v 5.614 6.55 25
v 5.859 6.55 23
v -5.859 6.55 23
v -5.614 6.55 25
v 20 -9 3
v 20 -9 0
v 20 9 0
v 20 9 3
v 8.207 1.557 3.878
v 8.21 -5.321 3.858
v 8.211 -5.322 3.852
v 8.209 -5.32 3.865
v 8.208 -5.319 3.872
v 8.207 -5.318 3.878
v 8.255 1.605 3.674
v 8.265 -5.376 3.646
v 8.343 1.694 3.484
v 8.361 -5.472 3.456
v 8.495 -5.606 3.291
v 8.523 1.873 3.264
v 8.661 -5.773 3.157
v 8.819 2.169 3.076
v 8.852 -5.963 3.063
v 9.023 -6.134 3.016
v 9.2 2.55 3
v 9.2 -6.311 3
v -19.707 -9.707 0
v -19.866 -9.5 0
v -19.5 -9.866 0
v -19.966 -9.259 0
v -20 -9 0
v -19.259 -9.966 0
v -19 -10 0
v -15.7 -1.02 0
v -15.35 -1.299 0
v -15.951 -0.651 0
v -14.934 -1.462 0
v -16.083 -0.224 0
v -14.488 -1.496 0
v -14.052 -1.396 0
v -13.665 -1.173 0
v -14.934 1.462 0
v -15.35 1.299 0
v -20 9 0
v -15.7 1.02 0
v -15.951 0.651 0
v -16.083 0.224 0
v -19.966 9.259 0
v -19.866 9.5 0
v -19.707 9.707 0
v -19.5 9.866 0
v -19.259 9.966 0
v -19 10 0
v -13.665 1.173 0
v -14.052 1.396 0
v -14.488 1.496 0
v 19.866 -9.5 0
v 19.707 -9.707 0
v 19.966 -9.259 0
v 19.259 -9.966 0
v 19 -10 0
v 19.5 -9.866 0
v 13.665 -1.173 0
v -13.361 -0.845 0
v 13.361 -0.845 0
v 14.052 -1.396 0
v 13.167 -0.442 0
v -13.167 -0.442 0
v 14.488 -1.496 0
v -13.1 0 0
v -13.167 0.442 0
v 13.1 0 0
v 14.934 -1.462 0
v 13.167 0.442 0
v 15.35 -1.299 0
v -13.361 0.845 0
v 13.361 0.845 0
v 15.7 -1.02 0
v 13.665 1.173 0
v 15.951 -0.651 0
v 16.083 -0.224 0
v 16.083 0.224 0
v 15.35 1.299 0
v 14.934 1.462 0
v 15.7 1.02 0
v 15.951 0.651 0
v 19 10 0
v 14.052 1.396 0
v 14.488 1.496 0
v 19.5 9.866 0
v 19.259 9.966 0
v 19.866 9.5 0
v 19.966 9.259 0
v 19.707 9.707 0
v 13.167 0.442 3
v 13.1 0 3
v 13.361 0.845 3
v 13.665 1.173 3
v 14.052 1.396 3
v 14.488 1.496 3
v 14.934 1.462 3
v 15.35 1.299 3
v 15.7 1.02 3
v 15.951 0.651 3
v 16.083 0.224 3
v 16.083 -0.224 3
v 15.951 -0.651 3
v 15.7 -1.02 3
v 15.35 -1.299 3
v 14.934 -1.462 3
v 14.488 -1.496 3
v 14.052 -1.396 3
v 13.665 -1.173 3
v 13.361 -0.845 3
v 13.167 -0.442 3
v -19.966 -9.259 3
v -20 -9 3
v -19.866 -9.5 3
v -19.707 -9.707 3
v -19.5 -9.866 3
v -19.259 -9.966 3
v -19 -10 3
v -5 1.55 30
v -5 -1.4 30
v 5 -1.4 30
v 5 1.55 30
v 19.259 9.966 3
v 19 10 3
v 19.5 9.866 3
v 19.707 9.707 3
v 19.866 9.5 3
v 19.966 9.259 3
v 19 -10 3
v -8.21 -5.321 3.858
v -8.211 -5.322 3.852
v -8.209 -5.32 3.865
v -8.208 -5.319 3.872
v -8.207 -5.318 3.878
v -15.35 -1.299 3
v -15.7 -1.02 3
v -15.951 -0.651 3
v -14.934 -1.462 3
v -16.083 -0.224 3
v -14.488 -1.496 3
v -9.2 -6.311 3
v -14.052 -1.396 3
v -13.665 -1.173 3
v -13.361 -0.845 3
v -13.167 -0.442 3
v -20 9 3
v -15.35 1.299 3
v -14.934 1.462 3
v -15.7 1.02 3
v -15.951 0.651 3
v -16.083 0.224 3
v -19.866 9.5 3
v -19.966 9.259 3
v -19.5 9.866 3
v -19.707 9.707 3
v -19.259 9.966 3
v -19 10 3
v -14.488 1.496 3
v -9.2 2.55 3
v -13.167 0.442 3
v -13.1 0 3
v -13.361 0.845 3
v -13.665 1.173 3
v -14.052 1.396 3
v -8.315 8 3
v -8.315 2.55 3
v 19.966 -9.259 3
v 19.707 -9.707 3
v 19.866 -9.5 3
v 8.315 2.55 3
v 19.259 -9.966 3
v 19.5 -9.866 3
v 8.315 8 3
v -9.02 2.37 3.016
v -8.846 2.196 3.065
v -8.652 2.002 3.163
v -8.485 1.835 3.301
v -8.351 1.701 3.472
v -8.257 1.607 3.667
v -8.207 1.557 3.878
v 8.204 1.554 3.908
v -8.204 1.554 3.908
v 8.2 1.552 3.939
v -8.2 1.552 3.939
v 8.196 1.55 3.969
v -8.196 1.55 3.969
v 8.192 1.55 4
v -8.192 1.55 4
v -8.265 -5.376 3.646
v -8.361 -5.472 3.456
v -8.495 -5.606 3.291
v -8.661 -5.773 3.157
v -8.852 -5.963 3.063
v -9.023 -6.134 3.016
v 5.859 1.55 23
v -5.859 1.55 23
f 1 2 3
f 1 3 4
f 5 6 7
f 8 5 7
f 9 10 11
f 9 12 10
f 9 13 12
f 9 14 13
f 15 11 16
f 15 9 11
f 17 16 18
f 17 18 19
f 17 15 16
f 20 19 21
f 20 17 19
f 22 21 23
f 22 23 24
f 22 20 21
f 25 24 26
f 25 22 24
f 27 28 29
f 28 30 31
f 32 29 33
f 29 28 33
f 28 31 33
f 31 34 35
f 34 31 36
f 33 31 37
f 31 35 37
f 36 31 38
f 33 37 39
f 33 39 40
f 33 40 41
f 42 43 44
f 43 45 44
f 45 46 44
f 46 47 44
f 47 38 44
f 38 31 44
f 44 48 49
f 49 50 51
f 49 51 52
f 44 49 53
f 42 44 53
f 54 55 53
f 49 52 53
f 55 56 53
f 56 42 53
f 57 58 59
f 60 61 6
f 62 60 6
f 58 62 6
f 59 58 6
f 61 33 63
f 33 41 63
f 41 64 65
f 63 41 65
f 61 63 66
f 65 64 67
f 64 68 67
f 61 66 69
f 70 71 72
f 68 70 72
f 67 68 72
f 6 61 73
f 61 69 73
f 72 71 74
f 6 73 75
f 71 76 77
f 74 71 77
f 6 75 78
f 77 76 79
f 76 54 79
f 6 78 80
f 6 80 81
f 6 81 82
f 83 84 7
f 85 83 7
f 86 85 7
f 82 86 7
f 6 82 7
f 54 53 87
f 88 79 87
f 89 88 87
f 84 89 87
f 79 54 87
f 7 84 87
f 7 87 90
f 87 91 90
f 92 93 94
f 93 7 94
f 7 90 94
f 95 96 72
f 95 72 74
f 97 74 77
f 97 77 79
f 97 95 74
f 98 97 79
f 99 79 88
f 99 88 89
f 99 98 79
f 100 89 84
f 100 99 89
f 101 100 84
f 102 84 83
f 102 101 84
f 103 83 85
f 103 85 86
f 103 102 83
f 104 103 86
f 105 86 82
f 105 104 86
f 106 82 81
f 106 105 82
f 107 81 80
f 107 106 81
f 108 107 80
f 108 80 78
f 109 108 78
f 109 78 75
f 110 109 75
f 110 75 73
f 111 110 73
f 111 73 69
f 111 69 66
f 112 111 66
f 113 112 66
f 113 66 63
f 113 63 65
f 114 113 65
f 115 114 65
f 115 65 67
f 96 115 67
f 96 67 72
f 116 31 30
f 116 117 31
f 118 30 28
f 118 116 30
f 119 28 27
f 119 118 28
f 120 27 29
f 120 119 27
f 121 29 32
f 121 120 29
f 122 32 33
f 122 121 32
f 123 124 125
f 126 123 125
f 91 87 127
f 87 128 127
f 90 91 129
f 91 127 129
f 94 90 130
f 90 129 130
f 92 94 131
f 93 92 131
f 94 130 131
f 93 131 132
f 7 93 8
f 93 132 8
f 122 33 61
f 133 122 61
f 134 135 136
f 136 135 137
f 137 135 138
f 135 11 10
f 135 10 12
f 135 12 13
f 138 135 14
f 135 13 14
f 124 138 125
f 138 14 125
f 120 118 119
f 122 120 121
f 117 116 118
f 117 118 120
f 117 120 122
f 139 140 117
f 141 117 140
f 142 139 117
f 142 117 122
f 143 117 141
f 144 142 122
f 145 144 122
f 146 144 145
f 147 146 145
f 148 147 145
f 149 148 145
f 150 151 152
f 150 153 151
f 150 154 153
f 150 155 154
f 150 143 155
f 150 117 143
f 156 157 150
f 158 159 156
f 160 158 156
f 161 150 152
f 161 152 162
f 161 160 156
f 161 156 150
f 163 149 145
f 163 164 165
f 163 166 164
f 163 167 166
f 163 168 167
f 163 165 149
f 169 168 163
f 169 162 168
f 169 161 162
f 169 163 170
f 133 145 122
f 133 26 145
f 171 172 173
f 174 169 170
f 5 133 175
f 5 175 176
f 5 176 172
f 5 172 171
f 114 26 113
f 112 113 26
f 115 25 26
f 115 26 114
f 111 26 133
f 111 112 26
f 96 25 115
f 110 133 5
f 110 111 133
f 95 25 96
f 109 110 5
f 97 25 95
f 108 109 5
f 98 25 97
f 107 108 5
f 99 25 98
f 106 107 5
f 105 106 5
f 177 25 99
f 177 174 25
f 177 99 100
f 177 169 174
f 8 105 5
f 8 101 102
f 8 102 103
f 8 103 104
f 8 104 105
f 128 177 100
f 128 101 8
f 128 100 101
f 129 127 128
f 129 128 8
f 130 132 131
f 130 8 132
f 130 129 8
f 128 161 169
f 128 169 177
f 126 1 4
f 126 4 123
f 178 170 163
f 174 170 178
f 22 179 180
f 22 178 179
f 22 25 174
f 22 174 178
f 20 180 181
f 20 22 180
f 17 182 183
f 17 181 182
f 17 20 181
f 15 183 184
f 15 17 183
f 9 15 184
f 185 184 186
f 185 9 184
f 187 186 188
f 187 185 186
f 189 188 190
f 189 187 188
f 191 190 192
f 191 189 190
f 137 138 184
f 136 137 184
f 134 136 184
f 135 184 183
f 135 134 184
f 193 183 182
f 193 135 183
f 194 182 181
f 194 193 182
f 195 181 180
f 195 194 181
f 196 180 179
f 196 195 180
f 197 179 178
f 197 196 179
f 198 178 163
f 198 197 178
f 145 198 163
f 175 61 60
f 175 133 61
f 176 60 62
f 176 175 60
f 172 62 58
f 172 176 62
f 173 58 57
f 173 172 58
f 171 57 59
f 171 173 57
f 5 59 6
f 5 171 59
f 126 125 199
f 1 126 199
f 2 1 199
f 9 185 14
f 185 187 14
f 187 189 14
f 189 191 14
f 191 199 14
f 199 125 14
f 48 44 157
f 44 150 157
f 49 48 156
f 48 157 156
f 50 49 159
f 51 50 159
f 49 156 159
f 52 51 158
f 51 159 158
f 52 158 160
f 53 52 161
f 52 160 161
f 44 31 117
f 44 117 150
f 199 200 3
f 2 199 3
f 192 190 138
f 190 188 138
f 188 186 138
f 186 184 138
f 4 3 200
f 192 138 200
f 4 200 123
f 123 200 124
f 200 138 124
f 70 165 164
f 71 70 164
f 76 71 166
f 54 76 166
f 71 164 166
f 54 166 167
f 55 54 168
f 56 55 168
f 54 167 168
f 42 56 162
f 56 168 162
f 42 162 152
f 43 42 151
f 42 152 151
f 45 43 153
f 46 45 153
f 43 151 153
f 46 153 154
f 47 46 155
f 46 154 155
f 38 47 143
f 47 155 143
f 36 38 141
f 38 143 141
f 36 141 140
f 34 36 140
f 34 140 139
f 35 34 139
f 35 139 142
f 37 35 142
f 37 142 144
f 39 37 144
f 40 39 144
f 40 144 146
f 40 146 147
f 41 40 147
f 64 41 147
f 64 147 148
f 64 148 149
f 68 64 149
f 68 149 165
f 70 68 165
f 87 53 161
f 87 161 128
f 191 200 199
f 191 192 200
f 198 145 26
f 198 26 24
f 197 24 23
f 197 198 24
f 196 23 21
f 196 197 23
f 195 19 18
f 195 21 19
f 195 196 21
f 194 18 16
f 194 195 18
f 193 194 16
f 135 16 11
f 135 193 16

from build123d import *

# Parameters (mm, degrees)
SKETCH1_W           = 40
SKETCH1_H           = 20
BOSS_EXTRUDE1_DEPTH = 3
SNAP_START          = -1.4
SNAP_HOOK1_DEPTH    = 2.95
SNAP_START_2        = -8.315183144
SNAP_HOOK1_2_DEPTH  = 16.630366288
SNAP_START_3        = -5.859491926
SNAP_HOOK1_3_DEPTH  = 11.718983852
SNAP_START_4        = -6
SNAP_HOOK1_4_DEPTH  = 14
FILLET1_R           = 1
CUT_EXTRUDE1_REACH  = 37.057
SKETCH3_R           = 1.5
FILLET2_R           = 1


with BuildPart() as part:
    # Sketch1 → Boss-Extrude1 (new body)
    with BuildSketch(Plane.XY):
        Rectangle(SKETCH1_W, SKETCH1_H)
    extrude(amount=BOSS_EXTRUDE1_DEPTH)

    # Snap Hook1: read off the stored shape, not the designer's step
    # Snap Hook1 outline → Snap Hook1 (add)
    with BuildSketch(Plane(origin=(0, 0, 0), x_dir=(1, 0, 0), z_dir=(0, 1, 0)).offset(SNAP_START)):
        Polygon((8.315183144, -3), (-8.315183144, -3), (-5, -30), (5, -30), align=None)
    extrude(amount=SNAP_HOOK1_DEPTH)

    # Snap Hook1 2 outline → Snap Hook1 2 (add)
    with BuildSketch(Plane.YZ.offset(SNAP_START_2)):
        Polygon((-1.4, 3), (-1.4, 30), (-5.45, 3), align=None)
    extrude(amount=SNAP_HOOK1_2_DEPTH)

    # Snap Hook1 3 outline → Snap Hook1 3 (add)
    with BuildSketch(Plane.YZ.offset(SNAP_START_3)):
        Polygon((1.55, 30), (1.55, 23), (6.55, 23), (6.55, 25), align=None)
    extrude(amount=SNAP_HOOK1_3_DEPTH)

    # Snap Hook1 4 outline → Snap Hook1 4 (cut)
    with BuildSketch(Plane(origin=(0, 0, 0), x_dir=(1, 0, 0), z_dir=(0, 1, 0)).offset(SNAP_START_4)):
        Polygon((-8.315183144, -3), (-8.315183144, -31), (-4.877215439, -31), (-5, -30), align=None)
        Polygon((5, -30), (4.877215439, -31), (8.315183144, -31), (8.315183144, -3), align=None)
    extrude(amount=SNAP_HOOK1_4_DEPTH, mode=Mode.SUBTRACT)

    # Fillet1
    # the kernel refuses this fillet: 1 mm, written as the material it adds along each edge
    with BuildSketch(Plane(origin=(10.815183144, 1.55, 3), x_dir=(0, 1, 0), z_dir=(-1, 0, 0))) as fillet1_piece_1_section:
        with BuildLine():
            CenterArc((FILLET1_R, -FILLET1_R), FILLET1_R, 90, 90)
            Line((0, -FILLET1_R), (0, 0))
            Line((0, 0), (FILLET1_R, 0))
        make_face()
    fillet1_piece_1 = extrude(amount=21.630366288, mode=Mode.PRIVATE)
    fillet1_piece_1 = split(fillet1_piece_1, bisect_by=Plane(origin=(-8.031056326, 1.55, 5.314027238), z_dir=(0.9925461516430047, 0, -0.12186934339144287)), keep=Keep.TOP, mode=Mode.PRIVATE)
    fillet1_piece_1 = split(fillet1_piece_1, bisect_by=Plane(origin=(8.352313486, 1.55, 2.697597631), z_dir=(-0.9925461516430047, 0, -0.12186934339144287)), keep=Keep.TOP, mode=Mode.PRIVATE)
    add(fillet1_piece_1)
    with BuildSketch(Plane(origin=(8.315183144, 1.55, 3), x_dir=(1, 0, 0), z_dir=(0, -1, 0))) as fillet1_piece_2_section:
        with BuildLine():
            CenterArc((FILLET1_R * 0.884725264568, FILLET1_R), FILLET1_R, 186.999999999, 83.000000001)
            Line((-FILLET1_R * 0.107820887075, FILLET1_R * 0.878130656609), (0, 0))
            Line((0, 0), (FILLET1_R * 0.884725264568, 0))
        make_face()
    fillet1_piece_2 = extrude(amount=9.211813161, mode=Mode.PRIVATE)
    fillet1_piece_2 = split(fillet1_piece_2, bisect_by=Plane(origin=(8.315183144, -5.29596577, 4.026894866), z_dir=(0, 0.9889363528682975, -0.14834045293024464)), keep=Keep.TOP, mode=Mode.PRIVATE)
    add(fillet1_piece_2)
    with BuildSketch(Plane(origin=(-10.468151696, -5.45, 3), x_dir=(0, -1, 0), z_dir=(1, 0, 0))) as fillet1_piece_3_section:
        with BuildLine():
            CenterArc((FILLET1_R * 0.861187420808, -FILLET1_R), FILLET1_R, 90, 81.46923439)
            Line((-FILLET1_R * 0.12774893206, -FILLET1_R * 0.85165954707), (0, 0))
            Line((0, 0), (FILLET1_R * 0.861187420808, 0))
        make_face()
    fillet1_piece_3 = extrude(amount=20.936303392, mode=Mode.PRIVATE)
    fillet1_piece_3 = split(fillet1_piece_3, bisect_by=Plane(origin=(-8.347159328, -5.45, 2.739574883), z_dir=(0.9925461516430047, 0, -0.12186934339144287)), keep=Keep.TOP, mode=Mode.PRIVATE)
    fillet1_piece_3 = split(fillet1_piece_3, bisect_by=Plane(origin=(8.036210484, -5.45, 5.272049985), z_dir=(-0.9925461516430047, 0, -0.12186934339144287)), keep=Keep.TOP, mode=Mode.PRIVATE)
    add(fillet1_piece_3)
    with BuildSketch(Plane(origin=(-8.315183144, -7.661813161, 3), x_dir=(-1, 0, 0), z_dir=(0, 1, 0))) as fillet1_piece_4_section:
        with BuildLine():
            CenterArc((FILLET1_R * 0.884725264568, FILLET1_R), FILLET1_R, 186.999999999, 83.000000001)
            Line((-FILLET1_R * 0.107820887075, FILLET1_R * 0.878130656609), (0, 0))
            Line((0, 0), (FILLET1_R * 0.884725264568, 0))
        make_face()
    fillet1_piece_4 = extrude(amount=9.211813161, mode=Mode.PRIVATE)
    fillet1_piece_4 = split(fillet1_piece_4, bisect_by=Plane(origin=(-8.315183144, -5.498670705, 2.675528632), z_dir=(0, 0.9889363528682975, -0.14834045293024464)), keep=Keep.TOP, mode=Mode.PRIVATE)
    add(fillet1_piece_4)
    with BuildSketch(Plane(origin=(8.315183144, 3.761813161, 3), x_dir=(1, 0, 0), z_dir=(0, -1, 0))) as fillet1_piece_5a_section:
        with BuildLine():
            CenterArc((FILLET1_R * 0.884725264568, FILLET1_R), FILLET1_R, 186.999999999, 83.000000001)
            Line((-FILLET1_R * 0.107820887075, FILLET1_R * 0.878130656609), (0, 0))
            Line((0, 0), (FILLET1_R * 0.884725264568, 0))
        make_face()
    fillet1_piece_5a = extrude(amount=11.423626323, mode=Mode.PRIVATE)
    fillet1_piece_5a = split(fillet1_piece_5a, bisect_by=Plane(origin=(8.315183144, 1.55, 3), z_dir=(0, 1, 0)), keep=Keep.TOP, mode=Mode.PRIVATE)
    with BuildSketch(Plane(origin=(10.815183144, 1.55, 3), x_dir=(0, 1, 0), z_dir=(-1, 0, 0))) as fillet1_piece_5b_section:
        with BuildLine():
            CenterArc((FILLET1_R, -FILLET1_R), FILLET1_R, 90, 90)
            Line((0, -FILLET1_R), (0, 0))
            Line((0, 0), (FILLET1_R, 0))
        make_face()
    fillet1_piece_5b = extrude(amount=21.630366288, mode=Mode.PRIVATE)
    fillet1_piece_5b = split(fillet1_piece_5b, bisect_by=Plane(origin=(8.352313486, 1.55, 2.697597631), z_dir=(0.9925461516430047, 0, 0.12186934339144287)), keep=Keep.TOP, mode=Mode.PRIVATE)
    fillet1_piece_5 = fillet1_piece_5a & fillet1_piece_5b
    add(fillet1_piece_5)
    with BuildSketch(Plane(origin=(10.815183144, 1.55, 3), x_dir=(0, 1, 0), z_dir=(-1, 0, 0))) as fillet1_piece_6a_section:
        with BuildLine():
            CenterArc((FILLET1_R, -FILLET1_R), FILLET1_R, 90, 90)
            Line((0, -FILLET1_R), (0, 0))
            Line((0, 0), (FILLET1_R, 0))
        make_face()
    fillet1_piece_6a = extrude(amount=21.630366288, mode=Mode.PRIVATE)
    fillet1_piece_6a = split(fillet1_piece_6a, bisect_by=Plane(origin=(-8.031056326, 1.55, 5.314027238), z_dir=(-0.9925461516430047, 0, 0.12186934339144287)), keep=Keep.TOP, mode=Mode.PRIVATE)
    with BuildSketch(Plane(origin=(-8.315183144, -7.661813161, 3), x_dir=(-1, 0, 0), z_dir=(0, 1, 0))) as fillet1_piece_6b_section:
        with BuildLine():
            CenterArc((FILLET1_R * 0.884725264568, FILLET1_R), FILLET1_R, 186.999999999, 83.000000001)
            Line((-FILLET1_R * 0.107820887075, FILLET1_R * 0.878130656609), (0, 0))
            Line((0, 0), (FILLET1_R * 0.884725264568, 0))
        make_face()
    fillet1_piece_6b = extrude(amount=11.423626323, mode=Mode.PRIVATE)
    fillet1_piece_6b = split(fillet1_piece_6b, bisect_by=Plane(origin=(-8.315183144, 1.55, 3), z_dir=(0, 1, 0)), keep=Keep.TOP, mode=Mode.PRIVATE)
    fillet1_piece_6 = fillet1_piece_6a & fillet1_piece_6b
    add(fillet1_piece_6)
    with BuildSketch(Plane(origin=(-10.468151696, -5.45, 3), x_dir=(0, -1, 0), z_dir=(1, 0, 0))) as fillet1_piece_7a_section:
        with BuildLine():
            CenterArc((FILLET1_R * 0.861187420808, -FILLET1_R), FILLET1_R, 90, 81.46923439)
            Line((-FILLET1_R * 0.12774893206, -FILLET1_R * 0.85165954707), (0, 0))
            Line((0, 0), (FILLET1_R * 0.861187420808, 0))
        make_face()
    fillet1_piece_7a = extrude(amount=20.936303392, mode=Mode.PRIVATE)
    fillet1_piece_7a = split(fillet1_piece_7a, bisect_by=Plane(origin=(8.036210484, -5.45, 5.272049985), z_dir=(0.9925461516430047, 0, 0.12186934339144287)), keep=Keep.TOP, mode=Mode.PRIVATE)
    with BuildSketch(Plane(origin=(8.315183144, 1.55, 3), x_dir=(1, 0, 0), z_dir=(0, -1, 0))) as fillet1_piece_7b_section:
        with BuildLine():
            CenterArc((FILLET1_R * 0.884725264568, FILLET1_R), FILLET1_R, 186.999999999, 83.000000001)
            Line((-FILLET1_R * 0.107820887075, FILLET1_R * 0.878130656609), (0, 0))
            Line((0, 0), (FILLET1_R * 0.884725264568, 0))
        make_face()
    fillet1_piece_7b = extrude(amount=9.211813161, mode=Mode.PRIVATE)
    fillet1_piece_7b = split(fillet1_piece_7b, bisect_by=Plane(origin=(8.315183144, -5.29596577, 4.026894866), z_dir=(0, -0.9889363528682975, 0.14834045293024464)), keep=Keep.TOP, mode=Mode.PRIVATE)
    fillet1_piece_7 = fillet1_piece_7a & fillet1_piece_7b
    add(fillet1_piece_7)
    with BuildSketch(Plane(origin=(-10.468151696, -5.45, 3), x_dir=(0, -1, 0), z_dir=(1, 0, 0))) as fillet1_piece_8a_section:
        with BuildLine():
            CenterArc((FILLET1_R * 0.861187420808, -FILLET1_R), FILLET1_R, 90, 81.46923439)
            Line((-FILLET1_R * 0.12774893206, -FILLET1_R * 0.85165954707), (0, 0))
            Line((0, 0), (FILLET1_R * 0.861187420808, 0))
        make_face()
    fillet1_piece_8a = extrude(amount=20.936303392, mode=Mode.PRIVATE)
    fillet1_piece_8a = split(fillet1_piece_8a, bisect_by=Plane(origin=(-8.347159328, -5.45, 2.739574883), z_dir=(-0.9925461516430047, 0, 0.12186934339144287)), keep=Keep.TOP, mode=Mode.PRIVATE)
    with BuildSketch(Plane(origin=(-8.315183144, -7.661813161, 3), x_dir=(-1, 0, 0), z_dir=(0, 1, 0))) as fillet1_piece_8b_section:
        with BuildLine():
            CenterArc((FILLET1_R * 0.884725264568, FILLET1_R), FILLET1_R, 186.999999999, 83.000000001)
            Line((-FILLET1_R * 0.107820887075, FILLET1_R * 0.878130656609), (0, 0))
            Line((0, 0), (FILLET1_R * 0.884725264568, 0))
        make_face()
    fillet1_piece_8b = extrude(amount=9.211813161, mode=Mode.PRIVATE)
    fillet1_piece_8b = split(fillet1_piece_8b, bisect_by=Plane(origin=(-8.315183144, -5.498670705, 2.675528632), z_dir=(0, -0.9889363528682975, 0.14834045293024464)), keep=Keep.TOP, mode=Mode.PRIVATE)
    fillet1_piece_8 = fillet1_piece_8a & fillet1_piece_8b
    add(fillet1_piece_8)

    # Sketch3 → Cut-Extrude1 (cut, up to next)
    with BuildSketch(Plane.XY.offset(3), mode=Mode.PRIVATE) as cut_extrude1_sk1:
        with Locations((-14.599954204, 0)):
            Circle(SKETCH3_R)
    cut_extrude1_tool1 = extrude(cut_extrude1_sk1.sketch, amount=-CUT_EXTRUDE1_REACH, mode=Mode.PRIVATE) & part.part
    cut_extrude1 = cut_extrude1_tool1.solids().sort_by_distance((-14.599954, 0, 3))[0]
    add(cut_extrude1, mode=Mode.SUBTRACT)

    # Mirror1: Cut-Extrude1 across plane
    add(cut_extrude1.mirror(Plane(origin=(0, 0, 0), x_dir=(0, 0, 1), z_dir=(1, 0, 0))), mode=Mode.SUBTRACT)

    # Fillet2
    fillet2_edges = [part.edges().sort_by_distance(p)[0] for p in [
        (20, -10, 1.5),
        (-20, -10, 1.5),
        (-20, 10, 1.5),
        (20, 10, 1.5),
    ]]
    fillet(fillet2_edges, radius=FILLET2_R)


solid = part.part
